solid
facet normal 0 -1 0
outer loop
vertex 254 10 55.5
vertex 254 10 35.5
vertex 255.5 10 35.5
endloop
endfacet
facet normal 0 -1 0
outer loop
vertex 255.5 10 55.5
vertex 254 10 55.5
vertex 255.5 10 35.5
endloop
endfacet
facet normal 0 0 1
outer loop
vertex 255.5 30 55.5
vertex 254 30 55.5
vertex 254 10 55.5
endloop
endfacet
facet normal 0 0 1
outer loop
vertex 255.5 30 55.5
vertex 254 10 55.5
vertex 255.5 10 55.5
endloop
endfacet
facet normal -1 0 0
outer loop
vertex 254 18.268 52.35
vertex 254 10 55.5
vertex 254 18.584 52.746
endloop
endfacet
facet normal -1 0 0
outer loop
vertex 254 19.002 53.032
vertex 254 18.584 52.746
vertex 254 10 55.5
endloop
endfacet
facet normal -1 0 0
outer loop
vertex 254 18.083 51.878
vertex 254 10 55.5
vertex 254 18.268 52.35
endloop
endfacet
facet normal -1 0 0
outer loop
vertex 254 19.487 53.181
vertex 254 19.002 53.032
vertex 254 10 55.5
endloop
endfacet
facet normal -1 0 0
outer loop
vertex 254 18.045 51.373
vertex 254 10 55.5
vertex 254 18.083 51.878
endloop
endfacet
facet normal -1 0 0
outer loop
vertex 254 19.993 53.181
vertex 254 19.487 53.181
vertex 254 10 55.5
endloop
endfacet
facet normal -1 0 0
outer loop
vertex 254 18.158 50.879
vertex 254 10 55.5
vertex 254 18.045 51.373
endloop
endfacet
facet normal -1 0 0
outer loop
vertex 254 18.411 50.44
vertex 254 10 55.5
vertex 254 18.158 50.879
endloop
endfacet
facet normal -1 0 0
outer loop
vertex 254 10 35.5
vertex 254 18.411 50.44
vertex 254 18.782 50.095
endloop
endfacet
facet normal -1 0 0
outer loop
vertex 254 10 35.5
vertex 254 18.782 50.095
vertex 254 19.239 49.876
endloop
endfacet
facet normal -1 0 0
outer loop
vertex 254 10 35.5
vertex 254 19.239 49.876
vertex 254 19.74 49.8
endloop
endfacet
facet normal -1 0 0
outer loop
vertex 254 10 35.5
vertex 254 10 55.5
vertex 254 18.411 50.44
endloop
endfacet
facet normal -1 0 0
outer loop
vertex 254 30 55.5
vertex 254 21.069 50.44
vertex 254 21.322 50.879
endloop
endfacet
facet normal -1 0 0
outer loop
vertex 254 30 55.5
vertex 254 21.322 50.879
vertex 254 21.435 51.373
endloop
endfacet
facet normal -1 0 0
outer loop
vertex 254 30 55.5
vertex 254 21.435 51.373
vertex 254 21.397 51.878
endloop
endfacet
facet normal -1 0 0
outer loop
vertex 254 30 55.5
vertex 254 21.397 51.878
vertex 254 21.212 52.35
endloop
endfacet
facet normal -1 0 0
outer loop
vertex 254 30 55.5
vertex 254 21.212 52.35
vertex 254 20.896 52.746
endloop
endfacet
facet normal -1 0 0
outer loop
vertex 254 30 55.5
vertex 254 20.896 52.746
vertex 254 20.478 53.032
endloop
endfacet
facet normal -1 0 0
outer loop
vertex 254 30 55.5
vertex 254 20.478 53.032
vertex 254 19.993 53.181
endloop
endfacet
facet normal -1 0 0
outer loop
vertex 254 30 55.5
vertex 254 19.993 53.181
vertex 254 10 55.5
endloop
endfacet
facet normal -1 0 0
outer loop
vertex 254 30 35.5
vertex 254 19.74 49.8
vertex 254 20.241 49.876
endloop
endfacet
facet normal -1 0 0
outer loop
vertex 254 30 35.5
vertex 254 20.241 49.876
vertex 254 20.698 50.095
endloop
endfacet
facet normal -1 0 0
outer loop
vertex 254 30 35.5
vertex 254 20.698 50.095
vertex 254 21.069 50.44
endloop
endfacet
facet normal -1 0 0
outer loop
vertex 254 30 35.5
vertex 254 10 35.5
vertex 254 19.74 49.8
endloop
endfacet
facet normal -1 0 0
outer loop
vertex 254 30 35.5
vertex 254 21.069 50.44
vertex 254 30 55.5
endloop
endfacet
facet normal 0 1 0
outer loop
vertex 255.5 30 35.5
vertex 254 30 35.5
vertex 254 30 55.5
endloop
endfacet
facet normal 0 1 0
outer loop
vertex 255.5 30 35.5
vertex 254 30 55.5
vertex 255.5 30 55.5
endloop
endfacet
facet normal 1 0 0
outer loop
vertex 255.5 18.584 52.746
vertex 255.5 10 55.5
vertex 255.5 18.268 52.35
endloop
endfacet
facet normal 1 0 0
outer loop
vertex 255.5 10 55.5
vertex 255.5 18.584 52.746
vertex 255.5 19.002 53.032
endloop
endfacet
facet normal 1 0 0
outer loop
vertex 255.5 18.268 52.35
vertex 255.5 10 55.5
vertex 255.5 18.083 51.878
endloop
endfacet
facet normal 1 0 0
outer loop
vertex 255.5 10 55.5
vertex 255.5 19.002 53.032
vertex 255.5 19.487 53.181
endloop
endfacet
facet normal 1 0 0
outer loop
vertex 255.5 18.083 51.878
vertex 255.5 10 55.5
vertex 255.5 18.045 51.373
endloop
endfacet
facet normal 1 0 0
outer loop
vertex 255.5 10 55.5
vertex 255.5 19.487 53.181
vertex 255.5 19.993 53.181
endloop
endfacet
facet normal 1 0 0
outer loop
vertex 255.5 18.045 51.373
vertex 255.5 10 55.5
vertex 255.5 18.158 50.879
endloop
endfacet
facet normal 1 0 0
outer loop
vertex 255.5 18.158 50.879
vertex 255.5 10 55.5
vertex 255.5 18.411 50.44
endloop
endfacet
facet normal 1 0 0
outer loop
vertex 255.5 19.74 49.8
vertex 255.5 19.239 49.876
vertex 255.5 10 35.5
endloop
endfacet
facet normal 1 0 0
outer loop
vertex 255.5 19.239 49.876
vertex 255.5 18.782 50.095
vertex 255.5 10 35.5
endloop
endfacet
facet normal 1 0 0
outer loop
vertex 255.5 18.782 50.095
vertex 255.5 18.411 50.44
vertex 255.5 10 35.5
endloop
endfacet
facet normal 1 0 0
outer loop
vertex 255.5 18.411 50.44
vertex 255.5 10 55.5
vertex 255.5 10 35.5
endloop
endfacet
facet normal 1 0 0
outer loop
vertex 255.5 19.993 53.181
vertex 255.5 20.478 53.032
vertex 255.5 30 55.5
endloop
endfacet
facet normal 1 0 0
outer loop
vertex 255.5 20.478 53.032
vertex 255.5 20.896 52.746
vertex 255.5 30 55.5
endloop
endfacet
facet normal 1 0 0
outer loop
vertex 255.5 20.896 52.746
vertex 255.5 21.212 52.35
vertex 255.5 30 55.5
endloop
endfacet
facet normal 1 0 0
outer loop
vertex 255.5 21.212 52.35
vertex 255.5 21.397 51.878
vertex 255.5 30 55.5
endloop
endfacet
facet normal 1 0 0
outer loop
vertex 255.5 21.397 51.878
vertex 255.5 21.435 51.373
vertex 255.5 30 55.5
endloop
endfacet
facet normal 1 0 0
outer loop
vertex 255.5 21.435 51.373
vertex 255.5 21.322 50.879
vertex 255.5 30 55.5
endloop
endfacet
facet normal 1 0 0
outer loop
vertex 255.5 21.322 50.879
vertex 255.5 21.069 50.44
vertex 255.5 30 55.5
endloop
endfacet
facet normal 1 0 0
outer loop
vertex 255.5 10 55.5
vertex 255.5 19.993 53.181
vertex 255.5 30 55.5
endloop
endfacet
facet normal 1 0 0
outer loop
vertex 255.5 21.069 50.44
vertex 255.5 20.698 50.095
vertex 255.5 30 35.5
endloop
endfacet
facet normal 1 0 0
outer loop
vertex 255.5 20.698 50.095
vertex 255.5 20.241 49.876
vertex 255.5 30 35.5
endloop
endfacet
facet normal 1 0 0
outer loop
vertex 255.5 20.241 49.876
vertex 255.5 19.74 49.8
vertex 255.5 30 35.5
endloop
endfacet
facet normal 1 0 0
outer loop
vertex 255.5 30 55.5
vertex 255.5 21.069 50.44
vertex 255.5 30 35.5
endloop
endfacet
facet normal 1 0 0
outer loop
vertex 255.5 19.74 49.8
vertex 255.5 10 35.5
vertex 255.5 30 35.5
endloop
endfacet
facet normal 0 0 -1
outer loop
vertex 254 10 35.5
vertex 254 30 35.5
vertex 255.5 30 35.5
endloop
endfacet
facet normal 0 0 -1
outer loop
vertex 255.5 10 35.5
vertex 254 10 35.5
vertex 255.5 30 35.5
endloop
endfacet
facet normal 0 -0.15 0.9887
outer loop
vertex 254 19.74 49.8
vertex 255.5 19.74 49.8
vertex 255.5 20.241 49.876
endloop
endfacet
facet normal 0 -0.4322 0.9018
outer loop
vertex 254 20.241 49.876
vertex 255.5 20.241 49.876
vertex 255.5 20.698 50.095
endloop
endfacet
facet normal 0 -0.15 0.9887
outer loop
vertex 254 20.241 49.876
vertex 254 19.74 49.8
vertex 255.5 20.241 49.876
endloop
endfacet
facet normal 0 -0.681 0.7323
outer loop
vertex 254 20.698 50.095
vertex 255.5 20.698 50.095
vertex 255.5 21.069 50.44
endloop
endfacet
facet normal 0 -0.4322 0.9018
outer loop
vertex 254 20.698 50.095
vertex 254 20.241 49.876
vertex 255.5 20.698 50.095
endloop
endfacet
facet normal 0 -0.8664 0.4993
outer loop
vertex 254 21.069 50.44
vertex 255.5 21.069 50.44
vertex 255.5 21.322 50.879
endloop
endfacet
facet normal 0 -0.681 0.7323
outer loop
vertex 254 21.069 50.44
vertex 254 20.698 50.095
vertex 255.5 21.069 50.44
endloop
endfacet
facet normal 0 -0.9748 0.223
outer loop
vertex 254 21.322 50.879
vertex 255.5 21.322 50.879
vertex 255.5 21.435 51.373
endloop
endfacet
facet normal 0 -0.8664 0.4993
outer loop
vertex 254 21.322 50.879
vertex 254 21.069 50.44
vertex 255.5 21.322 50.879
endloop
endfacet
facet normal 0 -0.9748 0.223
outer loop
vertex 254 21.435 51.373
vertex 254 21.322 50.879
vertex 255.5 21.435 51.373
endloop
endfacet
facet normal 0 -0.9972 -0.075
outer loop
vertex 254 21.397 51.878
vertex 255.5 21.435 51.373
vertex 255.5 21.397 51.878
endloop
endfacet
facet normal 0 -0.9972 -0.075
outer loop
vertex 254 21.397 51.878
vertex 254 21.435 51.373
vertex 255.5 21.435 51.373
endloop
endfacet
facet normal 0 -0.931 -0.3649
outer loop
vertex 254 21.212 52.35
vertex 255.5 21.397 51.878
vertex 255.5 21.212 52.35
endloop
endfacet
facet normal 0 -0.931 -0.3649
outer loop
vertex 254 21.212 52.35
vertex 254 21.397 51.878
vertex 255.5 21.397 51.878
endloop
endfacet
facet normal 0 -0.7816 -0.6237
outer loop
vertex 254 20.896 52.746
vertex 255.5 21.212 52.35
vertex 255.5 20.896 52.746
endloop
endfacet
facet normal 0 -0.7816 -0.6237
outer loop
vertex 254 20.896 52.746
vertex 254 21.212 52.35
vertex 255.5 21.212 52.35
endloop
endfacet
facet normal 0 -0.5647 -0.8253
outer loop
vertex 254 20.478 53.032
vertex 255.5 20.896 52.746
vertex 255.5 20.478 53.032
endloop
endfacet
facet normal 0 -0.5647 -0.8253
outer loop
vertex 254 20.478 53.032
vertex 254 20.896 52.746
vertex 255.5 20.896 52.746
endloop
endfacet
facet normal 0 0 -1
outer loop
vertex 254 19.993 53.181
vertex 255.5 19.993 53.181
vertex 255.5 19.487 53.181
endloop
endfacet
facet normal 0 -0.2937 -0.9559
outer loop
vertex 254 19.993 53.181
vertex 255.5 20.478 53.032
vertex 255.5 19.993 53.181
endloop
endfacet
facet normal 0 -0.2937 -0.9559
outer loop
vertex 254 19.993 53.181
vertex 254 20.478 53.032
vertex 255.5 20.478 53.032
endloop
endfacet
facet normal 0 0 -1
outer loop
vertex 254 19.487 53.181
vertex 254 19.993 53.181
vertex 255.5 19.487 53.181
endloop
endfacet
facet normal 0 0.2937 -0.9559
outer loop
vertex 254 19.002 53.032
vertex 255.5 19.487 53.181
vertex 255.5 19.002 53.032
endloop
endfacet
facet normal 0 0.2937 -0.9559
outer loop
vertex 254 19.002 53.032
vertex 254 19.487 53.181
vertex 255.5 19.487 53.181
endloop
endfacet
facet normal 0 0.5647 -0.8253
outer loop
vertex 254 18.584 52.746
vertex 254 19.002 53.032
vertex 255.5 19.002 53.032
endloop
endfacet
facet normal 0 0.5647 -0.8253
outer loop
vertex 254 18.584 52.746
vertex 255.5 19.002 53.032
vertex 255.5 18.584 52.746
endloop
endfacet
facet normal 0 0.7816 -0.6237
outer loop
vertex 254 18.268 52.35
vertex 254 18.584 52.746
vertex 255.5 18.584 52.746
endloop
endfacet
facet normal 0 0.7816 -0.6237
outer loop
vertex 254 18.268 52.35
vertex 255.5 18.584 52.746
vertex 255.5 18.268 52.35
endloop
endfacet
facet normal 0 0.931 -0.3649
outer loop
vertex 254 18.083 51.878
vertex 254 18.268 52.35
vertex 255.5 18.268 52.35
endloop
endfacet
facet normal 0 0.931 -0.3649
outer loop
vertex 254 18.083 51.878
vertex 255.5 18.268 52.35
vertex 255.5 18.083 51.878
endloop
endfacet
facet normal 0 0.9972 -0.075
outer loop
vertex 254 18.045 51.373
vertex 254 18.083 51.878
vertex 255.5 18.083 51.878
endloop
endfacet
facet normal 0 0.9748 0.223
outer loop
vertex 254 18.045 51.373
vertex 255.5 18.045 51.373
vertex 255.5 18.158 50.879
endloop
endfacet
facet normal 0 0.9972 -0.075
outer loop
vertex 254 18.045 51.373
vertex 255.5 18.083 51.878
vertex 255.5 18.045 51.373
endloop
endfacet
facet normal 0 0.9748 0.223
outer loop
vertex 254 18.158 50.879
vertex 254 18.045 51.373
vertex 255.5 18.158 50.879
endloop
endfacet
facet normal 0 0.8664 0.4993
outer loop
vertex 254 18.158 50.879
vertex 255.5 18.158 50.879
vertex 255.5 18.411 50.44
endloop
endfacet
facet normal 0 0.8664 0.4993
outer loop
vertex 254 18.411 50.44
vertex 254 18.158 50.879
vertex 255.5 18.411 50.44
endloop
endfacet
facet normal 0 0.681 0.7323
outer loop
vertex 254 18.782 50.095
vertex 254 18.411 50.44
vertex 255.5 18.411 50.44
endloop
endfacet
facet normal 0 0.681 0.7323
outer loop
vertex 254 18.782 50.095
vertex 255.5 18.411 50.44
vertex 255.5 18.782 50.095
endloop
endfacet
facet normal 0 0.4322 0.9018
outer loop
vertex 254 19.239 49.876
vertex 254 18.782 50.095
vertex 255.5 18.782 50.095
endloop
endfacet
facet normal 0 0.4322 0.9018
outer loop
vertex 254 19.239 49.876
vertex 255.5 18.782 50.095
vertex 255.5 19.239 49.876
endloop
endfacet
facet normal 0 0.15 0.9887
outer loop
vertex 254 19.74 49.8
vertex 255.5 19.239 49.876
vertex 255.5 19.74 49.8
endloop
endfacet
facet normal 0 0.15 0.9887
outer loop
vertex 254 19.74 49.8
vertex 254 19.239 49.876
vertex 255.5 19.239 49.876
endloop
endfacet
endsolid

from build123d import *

# Parameters (mm, degrees)
CYLINDER033_R     = 1.7
CYLINDER033_DEPTH = 20
BOX045_W          = 1.5
BOX045_H          = 20
BOX045_DEPTH      = 20


with BuildPart() as cylinder033:
    # Cylinder033 → Cylinder033 (new body)
    with BuildSketch(Plane(origin=(254, 19.74, 51.5), x_dir=(0, 0, -1), z_dir=(1, 0, 0))):
        Circle(CYLINDER033_R)
    extrude(amount=CYLINDER033_DEPTH)


with BuildPart() as testside_wall:
    # Box045 → Box045 (new body)
    with BuildSketch(Plane(origin=(254, 10, 35.5), x_dir=(1, 0, 0), z_dir=(0, 0, 1))):
        with Locations((0.75, 10)):
            Rectangle(BOX045_W, BOX045_H)
    extrude(amount=BOX045_DEPTH)

    # Cut054: cut Cylinder033
    add(cylinder033.part, mode=Mode.SUBTRACT)


solid = testside_wall.part
